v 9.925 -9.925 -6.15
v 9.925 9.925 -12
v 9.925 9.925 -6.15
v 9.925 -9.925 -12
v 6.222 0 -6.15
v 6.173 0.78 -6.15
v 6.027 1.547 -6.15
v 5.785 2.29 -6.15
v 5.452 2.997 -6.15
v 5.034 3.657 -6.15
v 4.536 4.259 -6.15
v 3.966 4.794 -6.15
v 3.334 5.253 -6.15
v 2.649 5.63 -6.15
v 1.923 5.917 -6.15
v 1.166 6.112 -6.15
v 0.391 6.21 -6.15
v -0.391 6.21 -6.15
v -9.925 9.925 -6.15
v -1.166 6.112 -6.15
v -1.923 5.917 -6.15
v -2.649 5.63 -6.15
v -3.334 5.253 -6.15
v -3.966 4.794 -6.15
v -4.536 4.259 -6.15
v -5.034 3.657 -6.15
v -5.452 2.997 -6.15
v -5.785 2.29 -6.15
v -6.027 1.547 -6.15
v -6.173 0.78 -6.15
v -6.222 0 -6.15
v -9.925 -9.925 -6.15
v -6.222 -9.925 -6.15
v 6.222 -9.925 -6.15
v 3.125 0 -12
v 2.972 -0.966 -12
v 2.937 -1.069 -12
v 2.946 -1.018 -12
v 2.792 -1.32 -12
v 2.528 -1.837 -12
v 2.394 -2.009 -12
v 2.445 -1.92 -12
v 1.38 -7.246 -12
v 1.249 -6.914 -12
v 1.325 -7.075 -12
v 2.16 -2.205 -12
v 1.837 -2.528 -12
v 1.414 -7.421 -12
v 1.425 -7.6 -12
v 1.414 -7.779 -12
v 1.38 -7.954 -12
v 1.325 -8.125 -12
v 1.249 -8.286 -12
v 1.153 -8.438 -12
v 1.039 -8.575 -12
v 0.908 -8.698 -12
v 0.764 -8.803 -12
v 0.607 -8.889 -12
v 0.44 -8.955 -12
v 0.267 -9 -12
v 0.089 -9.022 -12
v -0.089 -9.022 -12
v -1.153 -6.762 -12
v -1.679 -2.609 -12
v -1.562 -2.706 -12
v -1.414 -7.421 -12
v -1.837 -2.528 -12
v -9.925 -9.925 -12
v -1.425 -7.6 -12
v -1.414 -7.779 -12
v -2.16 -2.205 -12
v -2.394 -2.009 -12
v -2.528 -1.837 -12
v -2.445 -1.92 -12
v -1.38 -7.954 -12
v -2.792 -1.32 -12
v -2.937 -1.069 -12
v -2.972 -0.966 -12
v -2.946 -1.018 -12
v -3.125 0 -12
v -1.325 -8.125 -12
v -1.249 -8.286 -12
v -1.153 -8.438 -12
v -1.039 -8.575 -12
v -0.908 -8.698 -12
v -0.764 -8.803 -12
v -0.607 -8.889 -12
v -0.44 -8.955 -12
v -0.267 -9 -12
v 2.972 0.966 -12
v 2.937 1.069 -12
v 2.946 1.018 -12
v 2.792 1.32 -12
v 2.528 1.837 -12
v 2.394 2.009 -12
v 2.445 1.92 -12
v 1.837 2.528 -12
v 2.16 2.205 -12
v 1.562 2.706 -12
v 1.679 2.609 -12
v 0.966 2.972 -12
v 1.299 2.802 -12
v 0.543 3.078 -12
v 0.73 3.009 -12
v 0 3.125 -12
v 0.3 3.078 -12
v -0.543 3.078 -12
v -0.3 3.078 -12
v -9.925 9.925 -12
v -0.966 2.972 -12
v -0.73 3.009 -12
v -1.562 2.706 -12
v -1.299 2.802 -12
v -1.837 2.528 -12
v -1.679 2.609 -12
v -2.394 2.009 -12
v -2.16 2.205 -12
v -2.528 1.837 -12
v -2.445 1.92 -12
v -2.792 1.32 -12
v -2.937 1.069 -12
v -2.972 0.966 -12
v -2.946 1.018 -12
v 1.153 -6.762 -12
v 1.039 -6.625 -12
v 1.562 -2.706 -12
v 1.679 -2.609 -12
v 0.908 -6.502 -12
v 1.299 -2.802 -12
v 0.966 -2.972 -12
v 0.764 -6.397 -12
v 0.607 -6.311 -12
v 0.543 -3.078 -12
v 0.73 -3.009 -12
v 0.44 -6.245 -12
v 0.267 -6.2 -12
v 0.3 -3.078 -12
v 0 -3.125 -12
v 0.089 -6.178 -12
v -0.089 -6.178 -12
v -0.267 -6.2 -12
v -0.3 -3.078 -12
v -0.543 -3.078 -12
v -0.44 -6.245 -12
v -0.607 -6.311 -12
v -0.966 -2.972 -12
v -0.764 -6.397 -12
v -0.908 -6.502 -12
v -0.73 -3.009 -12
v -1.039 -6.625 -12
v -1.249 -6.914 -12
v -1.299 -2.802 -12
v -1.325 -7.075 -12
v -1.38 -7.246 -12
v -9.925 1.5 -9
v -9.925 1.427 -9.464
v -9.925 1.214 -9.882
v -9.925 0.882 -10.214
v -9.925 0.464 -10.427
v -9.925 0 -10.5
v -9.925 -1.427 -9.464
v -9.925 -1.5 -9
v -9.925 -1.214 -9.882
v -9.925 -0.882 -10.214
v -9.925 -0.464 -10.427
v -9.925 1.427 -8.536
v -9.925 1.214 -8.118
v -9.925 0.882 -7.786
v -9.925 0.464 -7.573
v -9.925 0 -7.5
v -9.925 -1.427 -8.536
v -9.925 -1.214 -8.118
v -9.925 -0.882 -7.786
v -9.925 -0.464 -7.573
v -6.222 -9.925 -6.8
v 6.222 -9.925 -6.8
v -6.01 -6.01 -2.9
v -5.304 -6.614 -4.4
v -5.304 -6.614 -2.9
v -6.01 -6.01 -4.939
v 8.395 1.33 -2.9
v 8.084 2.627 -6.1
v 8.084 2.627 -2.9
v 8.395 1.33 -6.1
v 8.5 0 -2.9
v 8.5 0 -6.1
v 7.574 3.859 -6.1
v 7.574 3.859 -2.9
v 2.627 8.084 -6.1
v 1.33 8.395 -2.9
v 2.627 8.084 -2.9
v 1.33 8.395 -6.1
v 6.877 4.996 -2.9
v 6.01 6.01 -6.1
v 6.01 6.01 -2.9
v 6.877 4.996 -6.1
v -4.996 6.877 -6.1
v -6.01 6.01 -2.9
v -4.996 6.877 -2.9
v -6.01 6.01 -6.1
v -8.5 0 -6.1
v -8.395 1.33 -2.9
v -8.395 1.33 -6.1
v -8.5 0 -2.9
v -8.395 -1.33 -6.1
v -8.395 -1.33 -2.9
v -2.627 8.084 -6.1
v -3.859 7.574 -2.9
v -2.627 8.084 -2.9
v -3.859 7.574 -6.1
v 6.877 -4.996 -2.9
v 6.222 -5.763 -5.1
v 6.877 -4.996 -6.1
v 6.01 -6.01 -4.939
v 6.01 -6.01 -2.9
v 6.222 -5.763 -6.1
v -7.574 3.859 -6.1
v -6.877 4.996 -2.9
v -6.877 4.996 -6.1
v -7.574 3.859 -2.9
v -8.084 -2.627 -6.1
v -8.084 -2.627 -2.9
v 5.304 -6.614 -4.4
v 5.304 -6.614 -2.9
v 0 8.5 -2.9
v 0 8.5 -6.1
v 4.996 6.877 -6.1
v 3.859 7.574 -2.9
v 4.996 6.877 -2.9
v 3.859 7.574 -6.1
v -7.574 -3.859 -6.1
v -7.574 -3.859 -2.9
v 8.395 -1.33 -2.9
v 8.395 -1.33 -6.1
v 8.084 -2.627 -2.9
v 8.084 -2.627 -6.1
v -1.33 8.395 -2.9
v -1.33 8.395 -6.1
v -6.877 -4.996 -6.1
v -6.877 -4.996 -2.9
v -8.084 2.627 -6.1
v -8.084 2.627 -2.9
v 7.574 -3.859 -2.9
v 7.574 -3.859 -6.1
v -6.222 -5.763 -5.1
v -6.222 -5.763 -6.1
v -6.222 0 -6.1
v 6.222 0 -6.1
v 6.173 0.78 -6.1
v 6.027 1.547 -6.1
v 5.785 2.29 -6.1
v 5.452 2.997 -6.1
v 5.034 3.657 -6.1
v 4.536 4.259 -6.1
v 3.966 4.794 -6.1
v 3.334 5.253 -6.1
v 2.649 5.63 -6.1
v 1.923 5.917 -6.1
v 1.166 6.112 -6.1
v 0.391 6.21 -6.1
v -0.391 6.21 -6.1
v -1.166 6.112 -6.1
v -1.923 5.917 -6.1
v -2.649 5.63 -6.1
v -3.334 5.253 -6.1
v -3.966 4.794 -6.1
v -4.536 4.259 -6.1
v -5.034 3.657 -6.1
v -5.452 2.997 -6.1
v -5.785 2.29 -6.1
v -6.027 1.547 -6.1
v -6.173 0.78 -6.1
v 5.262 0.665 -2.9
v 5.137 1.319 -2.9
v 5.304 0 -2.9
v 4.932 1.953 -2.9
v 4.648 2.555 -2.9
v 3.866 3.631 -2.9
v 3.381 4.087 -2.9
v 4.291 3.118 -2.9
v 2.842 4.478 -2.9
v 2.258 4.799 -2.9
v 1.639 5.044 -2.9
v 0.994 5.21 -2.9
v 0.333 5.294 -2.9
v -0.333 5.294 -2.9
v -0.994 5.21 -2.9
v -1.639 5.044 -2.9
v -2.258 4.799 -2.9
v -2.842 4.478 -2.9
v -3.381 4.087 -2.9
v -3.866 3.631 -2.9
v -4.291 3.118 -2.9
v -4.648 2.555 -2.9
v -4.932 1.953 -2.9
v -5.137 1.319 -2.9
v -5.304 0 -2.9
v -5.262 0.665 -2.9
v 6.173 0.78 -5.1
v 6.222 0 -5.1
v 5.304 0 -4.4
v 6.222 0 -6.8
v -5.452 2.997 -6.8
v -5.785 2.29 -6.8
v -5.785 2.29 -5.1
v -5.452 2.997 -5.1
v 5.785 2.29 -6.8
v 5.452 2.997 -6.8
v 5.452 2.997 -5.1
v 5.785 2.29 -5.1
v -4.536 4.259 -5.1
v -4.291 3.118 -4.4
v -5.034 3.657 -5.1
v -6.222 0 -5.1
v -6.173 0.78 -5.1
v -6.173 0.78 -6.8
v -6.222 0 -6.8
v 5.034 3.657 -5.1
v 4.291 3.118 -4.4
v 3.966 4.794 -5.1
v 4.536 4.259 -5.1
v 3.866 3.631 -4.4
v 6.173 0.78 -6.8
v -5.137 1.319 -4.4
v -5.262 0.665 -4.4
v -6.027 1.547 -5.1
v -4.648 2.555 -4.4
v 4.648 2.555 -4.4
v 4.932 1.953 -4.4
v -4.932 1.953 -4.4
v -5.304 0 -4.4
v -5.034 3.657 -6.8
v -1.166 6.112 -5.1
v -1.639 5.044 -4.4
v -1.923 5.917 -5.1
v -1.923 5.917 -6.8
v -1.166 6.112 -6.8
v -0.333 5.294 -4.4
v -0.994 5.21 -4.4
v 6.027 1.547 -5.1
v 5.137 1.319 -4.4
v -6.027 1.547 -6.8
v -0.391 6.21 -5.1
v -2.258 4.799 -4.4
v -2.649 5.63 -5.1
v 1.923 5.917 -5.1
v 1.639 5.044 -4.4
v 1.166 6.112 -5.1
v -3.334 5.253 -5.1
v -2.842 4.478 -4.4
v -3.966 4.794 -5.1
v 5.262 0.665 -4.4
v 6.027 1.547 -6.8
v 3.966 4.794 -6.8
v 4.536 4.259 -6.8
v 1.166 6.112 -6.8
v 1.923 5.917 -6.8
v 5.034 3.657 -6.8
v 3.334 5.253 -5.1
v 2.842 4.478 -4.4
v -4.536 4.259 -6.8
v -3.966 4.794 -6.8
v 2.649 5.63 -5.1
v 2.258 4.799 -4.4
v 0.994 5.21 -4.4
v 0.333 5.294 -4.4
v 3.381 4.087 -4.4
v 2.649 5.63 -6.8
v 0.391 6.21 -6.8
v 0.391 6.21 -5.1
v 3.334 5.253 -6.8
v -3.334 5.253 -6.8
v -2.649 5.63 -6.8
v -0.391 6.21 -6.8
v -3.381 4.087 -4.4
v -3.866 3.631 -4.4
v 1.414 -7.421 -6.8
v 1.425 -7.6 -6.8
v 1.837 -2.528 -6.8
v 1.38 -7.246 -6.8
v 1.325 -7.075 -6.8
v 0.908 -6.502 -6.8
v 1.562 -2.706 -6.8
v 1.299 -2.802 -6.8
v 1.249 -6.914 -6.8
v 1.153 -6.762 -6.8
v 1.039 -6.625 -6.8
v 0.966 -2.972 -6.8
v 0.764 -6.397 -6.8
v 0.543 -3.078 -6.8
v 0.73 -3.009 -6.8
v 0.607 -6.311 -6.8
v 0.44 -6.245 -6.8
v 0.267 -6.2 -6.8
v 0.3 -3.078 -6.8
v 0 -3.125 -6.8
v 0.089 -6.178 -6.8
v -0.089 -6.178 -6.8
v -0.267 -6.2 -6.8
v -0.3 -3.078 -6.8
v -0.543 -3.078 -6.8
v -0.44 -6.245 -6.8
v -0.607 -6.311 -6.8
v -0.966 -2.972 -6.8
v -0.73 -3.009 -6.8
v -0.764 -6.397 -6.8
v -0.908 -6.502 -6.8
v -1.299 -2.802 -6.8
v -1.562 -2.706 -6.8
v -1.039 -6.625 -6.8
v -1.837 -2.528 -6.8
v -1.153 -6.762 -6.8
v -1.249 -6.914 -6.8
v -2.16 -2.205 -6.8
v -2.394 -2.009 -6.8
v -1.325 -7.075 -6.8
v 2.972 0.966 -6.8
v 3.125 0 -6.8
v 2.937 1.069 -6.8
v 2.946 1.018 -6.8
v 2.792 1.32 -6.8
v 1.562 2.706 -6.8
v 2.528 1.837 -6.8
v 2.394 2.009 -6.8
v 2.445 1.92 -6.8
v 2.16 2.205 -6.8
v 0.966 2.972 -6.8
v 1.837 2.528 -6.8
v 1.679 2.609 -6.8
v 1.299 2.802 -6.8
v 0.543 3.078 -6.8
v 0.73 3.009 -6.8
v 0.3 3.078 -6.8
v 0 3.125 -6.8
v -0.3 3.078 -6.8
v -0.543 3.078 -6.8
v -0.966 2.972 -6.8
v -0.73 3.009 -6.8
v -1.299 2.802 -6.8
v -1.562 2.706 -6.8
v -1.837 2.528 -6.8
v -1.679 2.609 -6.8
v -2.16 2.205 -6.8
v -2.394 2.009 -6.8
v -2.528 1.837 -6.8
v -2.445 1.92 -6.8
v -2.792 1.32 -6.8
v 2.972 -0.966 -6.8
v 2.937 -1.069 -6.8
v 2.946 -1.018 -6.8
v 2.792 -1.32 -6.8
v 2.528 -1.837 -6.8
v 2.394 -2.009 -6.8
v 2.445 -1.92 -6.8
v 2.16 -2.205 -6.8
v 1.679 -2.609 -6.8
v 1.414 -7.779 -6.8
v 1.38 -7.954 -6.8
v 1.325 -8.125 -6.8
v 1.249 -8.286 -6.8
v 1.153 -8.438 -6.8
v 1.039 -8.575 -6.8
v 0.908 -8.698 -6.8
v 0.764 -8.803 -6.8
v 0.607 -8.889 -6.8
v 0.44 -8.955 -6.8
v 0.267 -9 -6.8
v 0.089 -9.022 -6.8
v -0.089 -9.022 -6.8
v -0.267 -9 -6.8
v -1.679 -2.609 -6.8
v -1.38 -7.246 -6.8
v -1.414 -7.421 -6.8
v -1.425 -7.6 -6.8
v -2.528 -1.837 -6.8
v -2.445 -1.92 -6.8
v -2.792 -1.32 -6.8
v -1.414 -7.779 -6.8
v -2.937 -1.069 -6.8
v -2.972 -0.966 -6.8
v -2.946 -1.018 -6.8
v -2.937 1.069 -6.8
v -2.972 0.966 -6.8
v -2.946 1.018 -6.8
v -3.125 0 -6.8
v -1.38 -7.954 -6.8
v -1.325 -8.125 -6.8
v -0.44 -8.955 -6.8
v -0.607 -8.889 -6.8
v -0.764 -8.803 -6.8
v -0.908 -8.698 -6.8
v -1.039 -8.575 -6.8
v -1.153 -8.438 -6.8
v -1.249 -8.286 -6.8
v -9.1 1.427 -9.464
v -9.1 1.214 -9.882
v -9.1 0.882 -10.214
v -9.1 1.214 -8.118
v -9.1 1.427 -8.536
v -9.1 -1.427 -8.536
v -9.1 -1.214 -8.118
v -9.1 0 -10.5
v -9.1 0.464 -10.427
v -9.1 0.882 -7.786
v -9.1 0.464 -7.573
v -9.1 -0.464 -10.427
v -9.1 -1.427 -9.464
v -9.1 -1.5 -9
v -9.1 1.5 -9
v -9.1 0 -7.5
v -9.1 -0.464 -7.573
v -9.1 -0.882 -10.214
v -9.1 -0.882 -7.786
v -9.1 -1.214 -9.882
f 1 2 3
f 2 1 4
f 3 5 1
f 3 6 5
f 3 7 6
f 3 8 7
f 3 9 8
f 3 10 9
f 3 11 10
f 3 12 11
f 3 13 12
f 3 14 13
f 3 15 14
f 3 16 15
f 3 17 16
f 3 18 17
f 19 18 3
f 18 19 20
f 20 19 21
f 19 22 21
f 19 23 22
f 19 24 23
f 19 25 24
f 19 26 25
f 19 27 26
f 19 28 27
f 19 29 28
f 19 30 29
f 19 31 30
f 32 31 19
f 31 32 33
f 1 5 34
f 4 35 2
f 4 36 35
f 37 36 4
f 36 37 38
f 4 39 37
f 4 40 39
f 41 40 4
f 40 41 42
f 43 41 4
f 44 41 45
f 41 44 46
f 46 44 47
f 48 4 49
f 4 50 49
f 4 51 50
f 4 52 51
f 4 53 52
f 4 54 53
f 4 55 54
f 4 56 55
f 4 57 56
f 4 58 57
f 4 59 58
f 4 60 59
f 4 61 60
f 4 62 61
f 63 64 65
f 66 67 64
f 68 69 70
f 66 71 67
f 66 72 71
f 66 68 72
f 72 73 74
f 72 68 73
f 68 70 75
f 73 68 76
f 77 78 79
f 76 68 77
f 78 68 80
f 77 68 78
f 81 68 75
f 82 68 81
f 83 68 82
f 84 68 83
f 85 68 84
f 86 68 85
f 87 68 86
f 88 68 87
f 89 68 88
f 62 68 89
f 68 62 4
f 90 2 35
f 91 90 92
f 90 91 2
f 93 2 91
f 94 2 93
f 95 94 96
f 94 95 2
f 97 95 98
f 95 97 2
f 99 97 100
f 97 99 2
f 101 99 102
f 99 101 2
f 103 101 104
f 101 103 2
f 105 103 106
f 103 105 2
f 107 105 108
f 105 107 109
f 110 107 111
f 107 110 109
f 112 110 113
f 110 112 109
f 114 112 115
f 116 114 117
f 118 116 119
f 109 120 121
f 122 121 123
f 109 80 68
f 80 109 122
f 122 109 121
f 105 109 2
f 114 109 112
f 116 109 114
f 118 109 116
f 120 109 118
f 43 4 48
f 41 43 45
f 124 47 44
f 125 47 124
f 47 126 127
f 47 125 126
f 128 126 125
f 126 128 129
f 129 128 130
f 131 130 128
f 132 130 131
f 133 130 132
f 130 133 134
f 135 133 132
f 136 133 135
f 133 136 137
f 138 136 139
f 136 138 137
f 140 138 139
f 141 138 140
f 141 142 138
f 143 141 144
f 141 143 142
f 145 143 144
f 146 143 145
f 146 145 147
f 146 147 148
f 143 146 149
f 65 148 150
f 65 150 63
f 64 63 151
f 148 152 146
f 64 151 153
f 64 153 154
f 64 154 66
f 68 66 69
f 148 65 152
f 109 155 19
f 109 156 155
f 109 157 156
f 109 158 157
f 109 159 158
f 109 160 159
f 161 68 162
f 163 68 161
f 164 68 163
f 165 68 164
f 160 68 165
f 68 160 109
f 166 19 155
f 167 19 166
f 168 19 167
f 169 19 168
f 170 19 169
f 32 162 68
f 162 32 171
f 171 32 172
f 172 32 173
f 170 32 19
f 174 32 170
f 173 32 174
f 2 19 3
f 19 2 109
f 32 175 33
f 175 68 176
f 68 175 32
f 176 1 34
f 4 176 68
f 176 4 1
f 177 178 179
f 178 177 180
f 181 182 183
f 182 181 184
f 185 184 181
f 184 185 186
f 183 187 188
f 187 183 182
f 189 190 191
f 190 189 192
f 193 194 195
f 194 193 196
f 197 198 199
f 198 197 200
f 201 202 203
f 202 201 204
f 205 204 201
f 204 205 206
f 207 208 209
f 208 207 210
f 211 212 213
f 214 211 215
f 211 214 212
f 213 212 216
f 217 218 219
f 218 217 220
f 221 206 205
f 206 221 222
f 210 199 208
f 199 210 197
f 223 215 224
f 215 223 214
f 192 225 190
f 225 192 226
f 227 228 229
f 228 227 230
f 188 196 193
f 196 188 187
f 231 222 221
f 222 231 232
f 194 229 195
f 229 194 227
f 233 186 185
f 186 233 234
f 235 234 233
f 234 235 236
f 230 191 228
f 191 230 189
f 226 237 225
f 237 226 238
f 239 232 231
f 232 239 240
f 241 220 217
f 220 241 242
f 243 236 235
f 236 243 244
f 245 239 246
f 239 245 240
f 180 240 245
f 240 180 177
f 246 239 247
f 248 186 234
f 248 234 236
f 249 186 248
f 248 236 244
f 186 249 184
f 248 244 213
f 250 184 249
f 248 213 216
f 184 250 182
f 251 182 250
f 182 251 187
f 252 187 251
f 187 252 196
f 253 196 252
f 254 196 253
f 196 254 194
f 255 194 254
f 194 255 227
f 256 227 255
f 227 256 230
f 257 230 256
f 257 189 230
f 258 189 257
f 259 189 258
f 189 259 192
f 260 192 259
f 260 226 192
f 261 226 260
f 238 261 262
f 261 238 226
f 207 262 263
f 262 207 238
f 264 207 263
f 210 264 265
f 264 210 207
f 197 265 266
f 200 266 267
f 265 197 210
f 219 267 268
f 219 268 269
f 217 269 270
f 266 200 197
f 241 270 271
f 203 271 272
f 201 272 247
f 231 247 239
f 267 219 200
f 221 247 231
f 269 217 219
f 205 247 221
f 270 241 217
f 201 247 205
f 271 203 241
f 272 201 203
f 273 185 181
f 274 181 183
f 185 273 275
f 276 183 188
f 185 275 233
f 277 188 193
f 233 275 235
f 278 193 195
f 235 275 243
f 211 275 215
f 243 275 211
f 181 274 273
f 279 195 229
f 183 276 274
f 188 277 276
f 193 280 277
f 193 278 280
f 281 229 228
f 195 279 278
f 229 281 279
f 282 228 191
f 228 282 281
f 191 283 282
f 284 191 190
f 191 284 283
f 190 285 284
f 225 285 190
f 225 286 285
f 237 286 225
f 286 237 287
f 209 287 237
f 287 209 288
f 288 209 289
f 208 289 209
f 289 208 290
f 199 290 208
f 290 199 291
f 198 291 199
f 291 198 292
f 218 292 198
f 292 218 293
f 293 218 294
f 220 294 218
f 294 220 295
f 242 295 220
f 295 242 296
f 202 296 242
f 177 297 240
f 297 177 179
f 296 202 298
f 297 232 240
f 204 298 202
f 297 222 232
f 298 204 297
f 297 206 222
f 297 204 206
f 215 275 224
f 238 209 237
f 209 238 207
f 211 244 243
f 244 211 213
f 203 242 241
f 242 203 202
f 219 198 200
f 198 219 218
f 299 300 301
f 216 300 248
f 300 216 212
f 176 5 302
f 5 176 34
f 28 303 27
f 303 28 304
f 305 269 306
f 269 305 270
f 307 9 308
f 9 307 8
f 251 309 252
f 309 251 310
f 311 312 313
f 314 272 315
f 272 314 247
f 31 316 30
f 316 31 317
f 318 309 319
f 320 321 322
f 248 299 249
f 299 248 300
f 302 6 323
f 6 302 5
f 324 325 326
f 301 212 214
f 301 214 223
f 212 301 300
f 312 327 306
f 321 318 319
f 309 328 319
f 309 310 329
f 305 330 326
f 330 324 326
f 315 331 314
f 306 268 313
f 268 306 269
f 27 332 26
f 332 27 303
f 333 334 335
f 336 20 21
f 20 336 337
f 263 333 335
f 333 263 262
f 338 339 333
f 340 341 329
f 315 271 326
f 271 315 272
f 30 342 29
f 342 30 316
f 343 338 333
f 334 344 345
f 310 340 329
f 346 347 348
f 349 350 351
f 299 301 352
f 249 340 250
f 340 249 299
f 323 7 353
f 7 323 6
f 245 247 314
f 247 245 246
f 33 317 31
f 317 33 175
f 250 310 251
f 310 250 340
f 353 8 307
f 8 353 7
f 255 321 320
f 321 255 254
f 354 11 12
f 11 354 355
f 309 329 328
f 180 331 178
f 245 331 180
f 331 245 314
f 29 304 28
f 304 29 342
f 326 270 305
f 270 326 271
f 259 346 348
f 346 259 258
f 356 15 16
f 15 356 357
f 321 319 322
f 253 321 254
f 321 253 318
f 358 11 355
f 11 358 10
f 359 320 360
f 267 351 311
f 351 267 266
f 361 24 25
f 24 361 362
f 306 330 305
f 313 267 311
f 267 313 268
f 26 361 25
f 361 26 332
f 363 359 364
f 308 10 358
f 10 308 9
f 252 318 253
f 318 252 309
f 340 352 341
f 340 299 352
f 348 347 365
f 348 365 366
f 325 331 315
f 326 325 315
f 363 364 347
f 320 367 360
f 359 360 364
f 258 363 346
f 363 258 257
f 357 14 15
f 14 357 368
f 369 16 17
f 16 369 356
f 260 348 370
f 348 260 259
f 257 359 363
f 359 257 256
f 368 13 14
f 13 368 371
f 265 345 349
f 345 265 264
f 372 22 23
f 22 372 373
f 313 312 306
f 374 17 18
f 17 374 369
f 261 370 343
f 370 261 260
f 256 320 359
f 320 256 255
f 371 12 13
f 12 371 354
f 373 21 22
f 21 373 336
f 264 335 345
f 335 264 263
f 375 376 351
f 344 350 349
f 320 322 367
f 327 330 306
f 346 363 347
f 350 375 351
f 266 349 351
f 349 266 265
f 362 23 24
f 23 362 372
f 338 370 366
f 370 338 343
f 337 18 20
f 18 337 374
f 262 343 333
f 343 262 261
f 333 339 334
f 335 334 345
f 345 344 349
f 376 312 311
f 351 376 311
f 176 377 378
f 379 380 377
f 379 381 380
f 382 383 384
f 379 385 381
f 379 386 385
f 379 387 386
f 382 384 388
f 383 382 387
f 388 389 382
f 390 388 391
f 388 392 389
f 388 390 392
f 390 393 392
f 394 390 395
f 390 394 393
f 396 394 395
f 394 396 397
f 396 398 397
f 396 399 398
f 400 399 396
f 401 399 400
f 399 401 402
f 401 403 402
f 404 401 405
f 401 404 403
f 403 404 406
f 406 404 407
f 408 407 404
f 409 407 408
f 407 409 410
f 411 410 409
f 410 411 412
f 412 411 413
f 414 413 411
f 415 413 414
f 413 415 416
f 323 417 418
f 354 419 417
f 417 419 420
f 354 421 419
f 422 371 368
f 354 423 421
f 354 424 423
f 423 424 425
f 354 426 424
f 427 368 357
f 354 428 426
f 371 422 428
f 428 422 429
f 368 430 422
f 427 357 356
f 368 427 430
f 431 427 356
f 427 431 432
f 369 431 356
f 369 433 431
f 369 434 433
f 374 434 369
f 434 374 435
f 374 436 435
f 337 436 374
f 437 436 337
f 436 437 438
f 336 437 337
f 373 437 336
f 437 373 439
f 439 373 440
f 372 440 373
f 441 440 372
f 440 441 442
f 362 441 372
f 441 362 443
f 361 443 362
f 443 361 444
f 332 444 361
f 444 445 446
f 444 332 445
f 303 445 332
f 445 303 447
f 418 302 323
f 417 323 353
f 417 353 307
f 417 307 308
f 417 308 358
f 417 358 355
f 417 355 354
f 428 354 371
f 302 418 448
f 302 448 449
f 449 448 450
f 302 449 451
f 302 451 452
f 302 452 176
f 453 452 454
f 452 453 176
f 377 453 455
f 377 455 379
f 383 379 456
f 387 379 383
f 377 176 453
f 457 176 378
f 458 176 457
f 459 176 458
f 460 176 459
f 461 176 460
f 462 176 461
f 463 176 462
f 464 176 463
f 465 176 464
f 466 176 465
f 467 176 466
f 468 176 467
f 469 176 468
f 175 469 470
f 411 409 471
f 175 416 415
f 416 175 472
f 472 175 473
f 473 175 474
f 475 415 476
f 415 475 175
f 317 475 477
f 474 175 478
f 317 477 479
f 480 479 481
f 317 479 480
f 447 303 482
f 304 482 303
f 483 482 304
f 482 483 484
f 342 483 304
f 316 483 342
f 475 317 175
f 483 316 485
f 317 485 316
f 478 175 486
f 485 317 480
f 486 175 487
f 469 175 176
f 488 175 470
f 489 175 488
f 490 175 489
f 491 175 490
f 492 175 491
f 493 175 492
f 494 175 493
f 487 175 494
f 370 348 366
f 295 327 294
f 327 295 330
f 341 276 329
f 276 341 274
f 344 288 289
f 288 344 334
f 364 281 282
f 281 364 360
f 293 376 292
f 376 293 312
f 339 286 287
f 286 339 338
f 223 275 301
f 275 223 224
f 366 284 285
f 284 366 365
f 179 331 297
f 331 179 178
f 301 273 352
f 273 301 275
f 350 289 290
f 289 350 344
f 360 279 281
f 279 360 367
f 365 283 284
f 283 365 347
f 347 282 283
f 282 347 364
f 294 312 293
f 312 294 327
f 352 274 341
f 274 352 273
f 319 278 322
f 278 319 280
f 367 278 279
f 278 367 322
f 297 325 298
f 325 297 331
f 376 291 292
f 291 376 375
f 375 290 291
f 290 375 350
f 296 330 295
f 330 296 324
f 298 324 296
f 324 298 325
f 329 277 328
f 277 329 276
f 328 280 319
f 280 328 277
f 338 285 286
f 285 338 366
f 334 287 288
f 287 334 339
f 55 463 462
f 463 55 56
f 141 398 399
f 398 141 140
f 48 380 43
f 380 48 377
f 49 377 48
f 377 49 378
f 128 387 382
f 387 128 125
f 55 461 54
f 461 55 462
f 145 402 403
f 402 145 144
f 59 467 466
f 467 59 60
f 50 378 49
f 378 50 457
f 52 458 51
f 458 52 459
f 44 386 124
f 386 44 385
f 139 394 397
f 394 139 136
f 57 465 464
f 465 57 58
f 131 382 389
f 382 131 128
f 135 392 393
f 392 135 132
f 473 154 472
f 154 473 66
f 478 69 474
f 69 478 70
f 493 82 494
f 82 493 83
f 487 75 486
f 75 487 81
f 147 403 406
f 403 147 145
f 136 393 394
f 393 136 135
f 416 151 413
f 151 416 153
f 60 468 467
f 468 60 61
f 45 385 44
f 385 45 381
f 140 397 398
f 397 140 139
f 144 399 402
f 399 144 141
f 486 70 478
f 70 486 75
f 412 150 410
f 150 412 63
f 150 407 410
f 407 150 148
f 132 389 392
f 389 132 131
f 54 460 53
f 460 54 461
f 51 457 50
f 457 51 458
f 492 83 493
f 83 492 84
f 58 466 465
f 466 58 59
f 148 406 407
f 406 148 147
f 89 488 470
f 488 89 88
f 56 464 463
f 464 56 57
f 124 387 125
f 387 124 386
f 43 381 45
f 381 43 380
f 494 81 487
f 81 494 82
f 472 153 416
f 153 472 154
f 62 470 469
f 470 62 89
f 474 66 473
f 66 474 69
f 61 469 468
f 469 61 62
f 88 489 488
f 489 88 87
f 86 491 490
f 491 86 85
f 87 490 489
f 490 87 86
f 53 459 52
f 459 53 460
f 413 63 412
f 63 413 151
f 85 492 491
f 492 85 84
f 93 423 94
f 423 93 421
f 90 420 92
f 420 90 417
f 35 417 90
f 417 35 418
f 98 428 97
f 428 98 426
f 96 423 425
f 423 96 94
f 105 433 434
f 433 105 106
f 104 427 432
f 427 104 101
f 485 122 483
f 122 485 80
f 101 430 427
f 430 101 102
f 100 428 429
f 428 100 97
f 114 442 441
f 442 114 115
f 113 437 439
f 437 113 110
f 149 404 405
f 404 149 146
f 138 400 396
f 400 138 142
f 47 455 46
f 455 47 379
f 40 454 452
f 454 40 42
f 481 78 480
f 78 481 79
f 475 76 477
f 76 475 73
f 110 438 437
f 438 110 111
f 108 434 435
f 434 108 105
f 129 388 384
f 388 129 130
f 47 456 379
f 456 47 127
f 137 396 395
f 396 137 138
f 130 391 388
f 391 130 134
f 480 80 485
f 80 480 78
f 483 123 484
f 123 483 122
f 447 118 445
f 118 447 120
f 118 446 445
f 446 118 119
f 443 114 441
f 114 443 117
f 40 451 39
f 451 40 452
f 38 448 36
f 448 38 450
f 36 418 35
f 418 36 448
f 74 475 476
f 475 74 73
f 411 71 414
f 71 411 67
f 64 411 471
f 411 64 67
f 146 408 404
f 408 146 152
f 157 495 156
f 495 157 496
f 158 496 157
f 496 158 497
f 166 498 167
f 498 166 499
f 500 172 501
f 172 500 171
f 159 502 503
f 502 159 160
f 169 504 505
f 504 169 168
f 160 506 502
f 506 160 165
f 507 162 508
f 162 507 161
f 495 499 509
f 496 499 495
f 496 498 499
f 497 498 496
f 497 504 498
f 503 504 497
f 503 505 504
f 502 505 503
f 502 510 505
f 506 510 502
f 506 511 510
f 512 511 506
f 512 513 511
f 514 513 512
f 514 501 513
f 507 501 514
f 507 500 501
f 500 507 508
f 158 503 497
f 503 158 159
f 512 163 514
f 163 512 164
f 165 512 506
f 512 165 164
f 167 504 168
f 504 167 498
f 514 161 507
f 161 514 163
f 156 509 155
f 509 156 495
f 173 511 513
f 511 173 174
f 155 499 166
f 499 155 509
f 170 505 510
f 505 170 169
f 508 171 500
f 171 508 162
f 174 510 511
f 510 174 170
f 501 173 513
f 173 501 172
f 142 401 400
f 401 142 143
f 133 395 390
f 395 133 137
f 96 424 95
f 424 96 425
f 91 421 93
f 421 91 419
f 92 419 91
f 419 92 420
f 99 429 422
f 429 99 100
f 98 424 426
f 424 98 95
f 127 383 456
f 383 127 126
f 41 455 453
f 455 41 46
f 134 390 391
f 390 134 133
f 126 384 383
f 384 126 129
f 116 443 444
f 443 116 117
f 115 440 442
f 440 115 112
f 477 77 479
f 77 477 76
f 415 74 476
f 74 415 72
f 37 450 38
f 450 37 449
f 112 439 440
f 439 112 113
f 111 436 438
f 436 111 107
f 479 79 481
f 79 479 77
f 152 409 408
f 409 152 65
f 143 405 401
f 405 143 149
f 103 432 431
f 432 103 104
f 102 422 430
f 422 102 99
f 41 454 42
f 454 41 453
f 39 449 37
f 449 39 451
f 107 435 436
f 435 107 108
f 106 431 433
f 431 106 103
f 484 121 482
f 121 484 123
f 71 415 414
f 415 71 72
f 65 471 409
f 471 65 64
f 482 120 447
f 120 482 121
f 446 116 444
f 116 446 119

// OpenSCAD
//
// TODO:
// - ditch the thread and use a flat cap screwed to the base with 3x m3 screws
// - fragilize the cone (eg. with a hollow backbone facing the gaps)

//
// Print with 
// - 0.2 mm layer & bottom/top thickness
// - 1.6 m walls
// - 100% infill
// Nb: I have a 0.4 mm nozzle


$fn=50;

PI=3.141592;
tol=0.1;

base_tol=0.15;

fitting_d= 0*(9.5 - 0.5); // zero to use a blind rivet nut, else specify your push-fit d
fitting_h= 6;

m3_head_d= 5.5;
m3_head_h= 1.6; 
m3_d_tight= 3 - 0.15;

// Filament and bowden tube
bowdenplug_bowden_diam= 6.15;
bowdenplug_bowden_inner_diam= 4;
bowdenplug_filament_tube= bowdenplug_bowden_diam + 0.1; // letting the bowden tube through all the parts is better in fact!

// Main sizes
bowdenplug_diameter= 20;			// outer diameter of the thread
bowdenplug_body_unused_thread_height= 4; // the male part of the thread is shortnened by this amount to make the assembly sexier

// Outside/plug sizes (the important values for the holder)
bowdenplug_base_diameter= bowdenplug_diameter - 3;
bowdenplug_base_height= 6;									// identical heights of the square clamp and the base cylinder
bowdenplug_base_width= bowdenplug_base_diameter + 3;	// horizontal size of the square base

bowdenplug_start_base= -bowdenplug_base_height*2;

//////////////// DRAW PARTS ////////////////
//
bowdenplug_body(); // includes the useful bowdenplug_base(false)
//
////////////////////////////////////////////

br_toth= 16.4;
br_main_d= 8.8+0.2;
br_should_d= 12;
br_should_th= 1.6;
br_lower_id= 7.4;
br_lower_ih= 7.4;
br_top_id= 4.9;

br_m3holder_off= br_should_d/2 + 3/2;

module blind_rivet()
{
	difference()
	{
		union()
		{
			cylinder(r=br_should_d/2, h=br_should_th);
			cylinder(r=br_main_d/2, h=br_toth);
		}
		/*translate([0,0,-tol])
		{
			cylinder(r=br_lower_id/2, h=br_lower_ih+tol);
			cylinder(r=br_top_id/2, h=br_toth+2*tol);
		}*/
	}
}


module bowdenplug_filament()
{
	color([1,0.8,0.8])
	{
		translate([0,0,-bowdenplug_base_height*2-10-tol])
			cylinder(r=bowdenplug_filament_tube/2, h= 100, $fn=18);
		translate([0,0,-bowdenplug_base_height])
			cylinder(r=bowdenplug_bowden_diam/2, h=100, $fn=20);
	}
}

// Screw thread
module bowdenplug_body()
{
	difference()
	{
		translate([0,0,-bowdenplug_base_height*2])
			bowdenplug_base();
		bowdenplug_filament();
	}
}

module hull_extrude()
{
  hull()
  {
    child(0);
    translate([0,-bowdenplug_base_width,0]) child(0);
  }
}

module bowdenplug_base()
{
	difference()
	{
		union()
		{
			translate([-bowdenplug_base_width/2,-bowdenplug_base_width/2,0])
			{
				// TODO: instead of an exact cube, we want slightly rounded corners (so it is a bit easier to insert in the feeder body)
				translate([+base_tol/2,+base_tol/2,0])
				cube([bowdenplug_base_width-base_tol, bowdenplug_base_width-base_tol, bowdenplug_base_height-base_tol]);
			}
// translate([0,0,bowdenplug_base_height]) cylinder(r=bowdenplug_base_diameter/2, h=bowdenplug_base_height+tol, $fn=40);
			if(fitting_d>0)
				translate([0,0,bowdenplug_base_height-tol]) cylinder(r=bowdenplug_base_diameter/2, h=fitting_h, $fn=40);
			else
				translate([0,0,bowdenplug_base_height-tol]) cylinder(r=bowdenplug_base_diameter/2, h=2*br_should_th, $fn=40);
		}
		translate([0,0,-tol*2])
			cylinder(r=bowdenplug_filament_tube/2, h=bowdenplug_base_height+2*tol, $fn=20);
		translate([0,0,bowdenplug_base_height-tol])
			cylinder(r=bowdenplug_bowden_diam/2, h=bowdenplug_base_height+3*tol, $fn=20);

		// And remove lateral maintaining screw holes
		translate([-bowdenplug_base_width/2-tol,0,bowdenplug_base_height/2])
			rotate([0,90,0])
				cylinder(r=3/2, h=1, $fn=20);

	      translate([0,0,bowdenplug_base_height-br_should_th/2])
	      {
					if(fitting_d>0)
						cylinder(r=fitting_d/2,h=br_should_th+10);
					else
					{
						scale([1.02,1.02,1])
						{
							hull_extrude()
							{
								union()
								{
									cylinder(r=br_should_d/2+tol,h=br_should_th+0.1);
									translate([0,0,br_should_th+0.1-tol]) 					
							cylinder(r1=br_should_d/2+tol,r2=br_should_d/2-0.8,h=0.8);
								}
							}
							hull_extrude()
							{
								cylinder(r=br_should_d/2-0.8,h=br_toth+0.2);
							}
						}
						%blind_rivet();
						translate([0, -(br_should_d/2+3/2+0.1), br_should_th])
							#m3_screw();
					}
	      }
	}
}

screw_h= 8;
module m3_screw()
{
  cylinder(r=m3_head_d/2+0.3,h=m3_head_h);
  translate([0,0,-screw_h]) cylinder(r=m3_d_tight/2,h=screw_h+tol);
}
